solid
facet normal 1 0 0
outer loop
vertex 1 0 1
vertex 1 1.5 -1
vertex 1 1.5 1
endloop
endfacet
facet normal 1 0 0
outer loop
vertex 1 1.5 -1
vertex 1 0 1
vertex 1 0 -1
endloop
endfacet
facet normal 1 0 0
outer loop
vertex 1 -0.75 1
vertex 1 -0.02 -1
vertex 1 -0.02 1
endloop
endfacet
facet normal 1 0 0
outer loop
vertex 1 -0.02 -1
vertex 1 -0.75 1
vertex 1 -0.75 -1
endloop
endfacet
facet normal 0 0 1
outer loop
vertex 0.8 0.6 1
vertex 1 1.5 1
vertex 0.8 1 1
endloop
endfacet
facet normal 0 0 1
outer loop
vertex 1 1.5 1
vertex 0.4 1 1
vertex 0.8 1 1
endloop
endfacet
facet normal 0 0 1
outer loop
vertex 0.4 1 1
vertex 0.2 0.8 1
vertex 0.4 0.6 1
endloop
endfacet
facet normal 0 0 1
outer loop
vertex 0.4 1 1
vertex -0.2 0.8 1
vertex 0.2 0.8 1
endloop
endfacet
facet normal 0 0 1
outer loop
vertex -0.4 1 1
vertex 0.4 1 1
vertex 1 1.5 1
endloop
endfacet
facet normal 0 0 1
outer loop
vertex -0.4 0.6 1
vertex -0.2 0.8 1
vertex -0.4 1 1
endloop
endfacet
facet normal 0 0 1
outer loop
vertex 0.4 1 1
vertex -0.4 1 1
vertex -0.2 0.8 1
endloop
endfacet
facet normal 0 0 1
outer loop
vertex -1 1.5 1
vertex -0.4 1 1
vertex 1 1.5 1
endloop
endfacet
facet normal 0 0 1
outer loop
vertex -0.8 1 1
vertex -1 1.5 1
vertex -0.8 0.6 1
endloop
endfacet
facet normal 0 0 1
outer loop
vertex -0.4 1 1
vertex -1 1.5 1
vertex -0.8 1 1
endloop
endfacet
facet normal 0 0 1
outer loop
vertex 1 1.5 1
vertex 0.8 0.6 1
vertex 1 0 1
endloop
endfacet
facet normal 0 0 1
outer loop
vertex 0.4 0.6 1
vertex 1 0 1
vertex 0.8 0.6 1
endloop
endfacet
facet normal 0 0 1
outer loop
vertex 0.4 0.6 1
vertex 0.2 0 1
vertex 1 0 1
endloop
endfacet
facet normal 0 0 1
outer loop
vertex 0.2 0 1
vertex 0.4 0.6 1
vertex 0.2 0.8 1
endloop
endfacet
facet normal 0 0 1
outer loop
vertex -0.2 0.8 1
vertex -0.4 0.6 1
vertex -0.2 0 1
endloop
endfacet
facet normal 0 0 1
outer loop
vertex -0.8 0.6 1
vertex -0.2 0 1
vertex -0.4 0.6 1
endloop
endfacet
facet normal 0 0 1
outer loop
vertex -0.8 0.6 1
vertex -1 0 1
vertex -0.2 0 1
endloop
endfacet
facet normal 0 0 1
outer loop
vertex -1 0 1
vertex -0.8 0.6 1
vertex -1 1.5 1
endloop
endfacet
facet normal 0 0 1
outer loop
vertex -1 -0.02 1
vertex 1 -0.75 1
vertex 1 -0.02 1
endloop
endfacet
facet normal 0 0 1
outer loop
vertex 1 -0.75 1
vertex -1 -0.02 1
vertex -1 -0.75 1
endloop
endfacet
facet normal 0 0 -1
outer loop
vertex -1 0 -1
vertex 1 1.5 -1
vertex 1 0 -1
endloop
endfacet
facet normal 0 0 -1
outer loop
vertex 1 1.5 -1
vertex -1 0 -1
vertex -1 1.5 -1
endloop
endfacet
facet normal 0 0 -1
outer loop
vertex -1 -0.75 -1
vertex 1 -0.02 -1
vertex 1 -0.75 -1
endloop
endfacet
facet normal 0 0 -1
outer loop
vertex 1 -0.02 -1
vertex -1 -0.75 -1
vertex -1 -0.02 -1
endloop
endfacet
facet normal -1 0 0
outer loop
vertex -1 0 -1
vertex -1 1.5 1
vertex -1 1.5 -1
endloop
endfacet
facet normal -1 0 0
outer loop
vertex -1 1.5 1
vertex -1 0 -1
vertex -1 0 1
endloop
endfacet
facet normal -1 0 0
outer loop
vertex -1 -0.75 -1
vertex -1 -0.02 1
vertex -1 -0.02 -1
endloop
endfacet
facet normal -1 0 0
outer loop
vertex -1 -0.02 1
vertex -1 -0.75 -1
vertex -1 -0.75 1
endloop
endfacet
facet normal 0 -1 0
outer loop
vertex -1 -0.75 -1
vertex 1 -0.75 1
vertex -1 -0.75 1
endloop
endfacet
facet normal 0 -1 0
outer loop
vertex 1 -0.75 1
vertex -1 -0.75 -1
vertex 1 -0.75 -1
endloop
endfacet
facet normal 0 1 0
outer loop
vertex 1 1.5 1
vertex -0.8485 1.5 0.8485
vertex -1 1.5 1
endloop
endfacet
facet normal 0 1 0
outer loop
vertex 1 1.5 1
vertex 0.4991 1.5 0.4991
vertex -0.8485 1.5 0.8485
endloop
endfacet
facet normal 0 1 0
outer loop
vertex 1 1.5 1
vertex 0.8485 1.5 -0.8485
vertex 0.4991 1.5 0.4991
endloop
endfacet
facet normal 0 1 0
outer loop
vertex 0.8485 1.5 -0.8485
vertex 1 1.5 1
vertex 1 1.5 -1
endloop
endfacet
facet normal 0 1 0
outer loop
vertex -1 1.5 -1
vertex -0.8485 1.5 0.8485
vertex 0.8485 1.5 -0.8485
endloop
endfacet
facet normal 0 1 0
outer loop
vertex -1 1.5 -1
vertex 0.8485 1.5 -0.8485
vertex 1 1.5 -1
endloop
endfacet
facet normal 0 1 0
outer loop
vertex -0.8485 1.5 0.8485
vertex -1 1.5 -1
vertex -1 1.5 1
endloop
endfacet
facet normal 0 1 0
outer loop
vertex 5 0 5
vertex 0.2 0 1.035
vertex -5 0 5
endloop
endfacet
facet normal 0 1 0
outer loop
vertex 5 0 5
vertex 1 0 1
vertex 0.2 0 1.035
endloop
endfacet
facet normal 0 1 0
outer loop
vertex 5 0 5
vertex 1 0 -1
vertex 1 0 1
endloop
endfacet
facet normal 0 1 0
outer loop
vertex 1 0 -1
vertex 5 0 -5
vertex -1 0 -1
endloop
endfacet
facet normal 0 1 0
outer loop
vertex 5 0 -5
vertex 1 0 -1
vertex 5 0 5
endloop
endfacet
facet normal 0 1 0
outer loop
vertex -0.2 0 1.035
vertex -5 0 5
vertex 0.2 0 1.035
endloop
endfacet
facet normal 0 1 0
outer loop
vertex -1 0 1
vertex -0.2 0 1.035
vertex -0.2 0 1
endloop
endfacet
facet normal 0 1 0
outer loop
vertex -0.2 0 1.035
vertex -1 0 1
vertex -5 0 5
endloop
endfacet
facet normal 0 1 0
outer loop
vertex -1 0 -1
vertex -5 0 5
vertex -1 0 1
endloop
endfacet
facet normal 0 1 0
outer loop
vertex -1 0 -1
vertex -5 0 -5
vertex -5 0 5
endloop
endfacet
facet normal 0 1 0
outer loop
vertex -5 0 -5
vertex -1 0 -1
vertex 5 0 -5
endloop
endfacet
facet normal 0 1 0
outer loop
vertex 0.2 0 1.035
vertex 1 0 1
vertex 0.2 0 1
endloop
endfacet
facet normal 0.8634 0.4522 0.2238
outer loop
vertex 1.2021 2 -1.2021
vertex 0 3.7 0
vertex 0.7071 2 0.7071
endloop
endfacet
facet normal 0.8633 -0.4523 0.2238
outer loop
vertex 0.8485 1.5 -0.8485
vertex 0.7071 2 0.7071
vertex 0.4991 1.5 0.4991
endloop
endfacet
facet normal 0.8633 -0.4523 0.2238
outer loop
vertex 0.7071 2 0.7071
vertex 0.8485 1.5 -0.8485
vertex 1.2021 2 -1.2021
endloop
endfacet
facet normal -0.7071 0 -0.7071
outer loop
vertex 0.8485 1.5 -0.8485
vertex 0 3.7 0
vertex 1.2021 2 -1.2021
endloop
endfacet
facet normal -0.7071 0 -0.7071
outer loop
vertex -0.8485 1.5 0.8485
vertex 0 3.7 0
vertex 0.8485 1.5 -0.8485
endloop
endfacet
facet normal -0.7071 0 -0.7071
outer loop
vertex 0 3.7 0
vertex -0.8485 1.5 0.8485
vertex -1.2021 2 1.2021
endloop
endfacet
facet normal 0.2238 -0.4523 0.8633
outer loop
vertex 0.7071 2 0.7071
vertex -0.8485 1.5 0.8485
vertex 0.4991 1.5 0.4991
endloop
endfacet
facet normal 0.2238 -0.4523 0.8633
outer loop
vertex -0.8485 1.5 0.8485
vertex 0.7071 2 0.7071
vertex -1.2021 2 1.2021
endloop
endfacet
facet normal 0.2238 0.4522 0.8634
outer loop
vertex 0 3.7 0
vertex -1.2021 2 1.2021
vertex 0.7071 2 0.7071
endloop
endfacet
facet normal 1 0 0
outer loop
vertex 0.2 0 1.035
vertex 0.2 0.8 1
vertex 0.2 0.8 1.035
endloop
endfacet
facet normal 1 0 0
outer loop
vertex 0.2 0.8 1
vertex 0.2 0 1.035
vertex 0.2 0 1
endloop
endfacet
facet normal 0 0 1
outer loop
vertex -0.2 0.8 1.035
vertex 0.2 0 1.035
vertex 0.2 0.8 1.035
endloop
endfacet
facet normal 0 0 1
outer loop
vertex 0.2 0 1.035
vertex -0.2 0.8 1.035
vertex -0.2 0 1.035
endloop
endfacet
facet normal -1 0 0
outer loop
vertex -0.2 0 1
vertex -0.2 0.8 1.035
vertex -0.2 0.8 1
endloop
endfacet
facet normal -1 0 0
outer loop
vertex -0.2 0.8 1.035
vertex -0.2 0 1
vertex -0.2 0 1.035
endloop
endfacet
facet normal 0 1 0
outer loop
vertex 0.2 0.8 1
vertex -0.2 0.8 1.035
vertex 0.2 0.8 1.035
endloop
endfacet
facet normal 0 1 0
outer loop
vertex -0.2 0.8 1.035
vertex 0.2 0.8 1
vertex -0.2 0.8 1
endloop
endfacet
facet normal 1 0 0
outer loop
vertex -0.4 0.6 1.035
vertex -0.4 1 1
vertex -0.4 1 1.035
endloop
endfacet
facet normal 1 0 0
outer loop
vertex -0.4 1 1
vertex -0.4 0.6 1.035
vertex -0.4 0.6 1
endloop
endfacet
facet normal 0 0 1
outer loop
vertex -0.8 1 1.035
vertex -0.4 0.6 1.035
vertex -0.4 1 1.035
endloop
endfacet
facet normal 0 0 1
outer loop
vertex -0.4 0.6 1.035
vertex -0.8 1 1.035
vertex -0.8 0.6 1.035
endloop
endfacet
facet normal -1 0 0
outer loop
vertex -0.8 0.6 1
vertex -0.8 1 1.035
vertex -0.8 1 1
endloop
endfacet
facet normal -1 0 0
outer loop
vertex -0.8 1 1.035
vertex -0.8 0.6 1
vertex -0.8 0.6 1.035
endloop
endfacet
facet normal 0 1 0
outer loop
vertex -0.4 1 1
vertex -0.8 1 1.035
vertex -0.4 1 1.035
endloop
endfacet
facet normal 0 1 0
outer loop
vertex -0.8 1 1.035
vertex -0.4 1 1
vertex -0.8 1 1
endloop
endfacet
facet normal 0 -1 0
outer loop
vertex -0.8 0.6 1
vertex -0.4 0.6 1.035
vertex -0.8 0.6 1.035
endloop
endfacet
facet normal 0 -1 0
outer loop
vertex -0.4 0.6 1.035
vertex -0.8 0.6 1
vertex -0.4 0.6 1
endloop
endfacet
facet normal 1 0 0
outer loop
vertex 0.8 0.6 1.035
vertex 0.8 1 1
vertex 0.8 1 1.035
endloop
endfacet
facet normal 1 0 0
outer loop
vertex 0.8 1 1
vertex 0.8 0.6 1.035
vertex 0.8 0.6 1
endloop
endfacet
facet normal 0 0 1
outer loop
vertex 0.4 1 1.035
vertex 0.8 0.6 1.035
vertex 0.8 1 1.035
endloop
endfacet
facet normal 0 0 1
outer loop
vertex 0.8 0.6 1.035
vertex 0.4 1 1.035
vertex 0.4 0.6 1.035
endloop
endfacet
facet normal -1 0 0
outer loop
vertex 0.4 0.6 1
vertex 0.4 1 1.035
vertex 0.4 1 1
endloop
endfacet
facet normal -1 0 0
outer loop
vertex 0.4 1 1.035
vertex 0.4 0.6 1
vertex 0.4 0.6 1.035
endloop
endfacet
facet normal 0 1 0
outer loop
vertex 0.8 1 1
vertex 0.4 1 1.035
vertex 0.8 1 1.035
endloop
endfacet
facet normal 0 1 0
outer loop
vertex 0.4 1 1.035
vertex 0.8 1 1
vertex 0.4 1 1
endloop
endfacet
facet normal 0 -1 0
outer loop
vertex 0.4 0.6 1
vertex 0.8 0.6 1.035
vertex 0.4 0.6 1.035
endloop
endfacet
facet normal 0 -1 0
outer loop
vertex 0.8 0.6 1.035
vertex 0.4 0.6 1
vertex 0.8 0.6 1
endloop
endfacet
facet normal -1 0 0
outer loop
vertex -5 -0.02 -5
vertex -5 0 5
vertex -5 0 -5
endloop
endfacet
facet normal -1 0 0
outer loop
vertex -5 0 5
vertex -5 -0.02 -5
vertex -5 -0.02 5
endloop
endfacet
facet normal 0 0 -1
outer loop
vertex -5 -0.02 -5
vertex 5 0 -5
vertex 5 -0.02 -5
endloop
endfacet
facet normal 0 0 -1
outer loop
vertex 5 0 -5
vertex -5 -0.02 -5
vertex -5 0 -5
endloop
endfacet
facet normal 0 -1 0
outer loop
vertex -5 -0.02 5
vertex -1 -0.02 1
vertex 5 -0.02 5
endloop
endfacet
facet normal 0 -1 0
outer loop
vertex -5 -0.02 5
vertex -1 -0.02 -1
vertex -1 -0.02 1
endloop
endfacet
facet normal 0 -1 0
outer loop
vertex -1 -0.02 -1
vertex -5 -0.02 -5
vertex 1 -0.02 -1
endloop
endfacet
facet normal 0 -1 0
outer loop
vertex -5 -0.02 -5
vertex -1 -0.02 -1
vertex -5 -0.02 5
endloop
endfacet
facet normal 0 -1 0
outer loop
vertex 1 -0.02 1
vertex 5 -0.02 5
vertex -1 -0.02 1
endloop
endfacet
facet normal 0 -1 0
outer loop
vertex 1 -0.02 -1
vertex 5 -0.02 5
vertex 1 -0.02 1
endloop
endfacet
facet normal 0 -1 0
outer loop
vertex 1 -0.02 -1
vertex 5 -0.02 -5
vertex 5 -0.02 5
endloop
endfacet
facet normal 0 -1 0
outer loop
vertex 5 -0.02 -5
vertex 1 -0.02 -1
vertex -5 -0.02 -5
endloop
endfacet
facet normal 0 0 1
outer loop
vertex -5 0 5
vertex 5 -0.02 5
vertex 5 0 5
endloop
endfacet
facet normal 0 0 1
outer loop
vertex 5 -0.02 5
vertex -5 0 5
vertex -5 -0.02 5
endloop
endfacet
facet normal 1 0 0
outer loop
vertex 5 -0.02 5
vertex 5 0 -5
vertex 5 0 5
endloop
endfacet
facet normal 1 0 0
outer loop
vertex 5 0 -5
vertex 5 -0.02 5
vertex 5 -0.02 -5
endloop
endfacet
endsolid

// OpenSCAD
// Background color: 0x87CEEB (sky blue)

// Main house body
// Material: 0xF5DEB3 (wheat)
cube([2, 1.5, 2], center = true);
translate([0, 0.75, 0]) cube([2, 1.5, 2], center = true);

// Roof
// Material: 0x8B4513 (saddle brown)
translate([0, 2.0, 0]) rotate([0, 45, 0]) cylinder(h = 1, r1 = 1.7, r2 = 0, $fn = 4);

// Door
// Material: 0x8B4513 (saddle brown)
translate([0, 0.4, 1.01]) cube([0.4, 0.8, 0.05], center = true);

// Windows
// Material: 0xADD8E6 (light blue) with emissive: 0x222222
translate([-0.6, 0.8, 1.01]) cube([0.4, 0.4, 0.05], center = true);
translate([0.6, 0.8, 1.01]) cube([0.4, 0.4, 0.05], center = true);

// Ground
// Material: 0x90EE90 (light green)
translate([0, -0.01, 0]) rotate([-90, 0, 0]) cube([10, 10, 0.02], center = true);
